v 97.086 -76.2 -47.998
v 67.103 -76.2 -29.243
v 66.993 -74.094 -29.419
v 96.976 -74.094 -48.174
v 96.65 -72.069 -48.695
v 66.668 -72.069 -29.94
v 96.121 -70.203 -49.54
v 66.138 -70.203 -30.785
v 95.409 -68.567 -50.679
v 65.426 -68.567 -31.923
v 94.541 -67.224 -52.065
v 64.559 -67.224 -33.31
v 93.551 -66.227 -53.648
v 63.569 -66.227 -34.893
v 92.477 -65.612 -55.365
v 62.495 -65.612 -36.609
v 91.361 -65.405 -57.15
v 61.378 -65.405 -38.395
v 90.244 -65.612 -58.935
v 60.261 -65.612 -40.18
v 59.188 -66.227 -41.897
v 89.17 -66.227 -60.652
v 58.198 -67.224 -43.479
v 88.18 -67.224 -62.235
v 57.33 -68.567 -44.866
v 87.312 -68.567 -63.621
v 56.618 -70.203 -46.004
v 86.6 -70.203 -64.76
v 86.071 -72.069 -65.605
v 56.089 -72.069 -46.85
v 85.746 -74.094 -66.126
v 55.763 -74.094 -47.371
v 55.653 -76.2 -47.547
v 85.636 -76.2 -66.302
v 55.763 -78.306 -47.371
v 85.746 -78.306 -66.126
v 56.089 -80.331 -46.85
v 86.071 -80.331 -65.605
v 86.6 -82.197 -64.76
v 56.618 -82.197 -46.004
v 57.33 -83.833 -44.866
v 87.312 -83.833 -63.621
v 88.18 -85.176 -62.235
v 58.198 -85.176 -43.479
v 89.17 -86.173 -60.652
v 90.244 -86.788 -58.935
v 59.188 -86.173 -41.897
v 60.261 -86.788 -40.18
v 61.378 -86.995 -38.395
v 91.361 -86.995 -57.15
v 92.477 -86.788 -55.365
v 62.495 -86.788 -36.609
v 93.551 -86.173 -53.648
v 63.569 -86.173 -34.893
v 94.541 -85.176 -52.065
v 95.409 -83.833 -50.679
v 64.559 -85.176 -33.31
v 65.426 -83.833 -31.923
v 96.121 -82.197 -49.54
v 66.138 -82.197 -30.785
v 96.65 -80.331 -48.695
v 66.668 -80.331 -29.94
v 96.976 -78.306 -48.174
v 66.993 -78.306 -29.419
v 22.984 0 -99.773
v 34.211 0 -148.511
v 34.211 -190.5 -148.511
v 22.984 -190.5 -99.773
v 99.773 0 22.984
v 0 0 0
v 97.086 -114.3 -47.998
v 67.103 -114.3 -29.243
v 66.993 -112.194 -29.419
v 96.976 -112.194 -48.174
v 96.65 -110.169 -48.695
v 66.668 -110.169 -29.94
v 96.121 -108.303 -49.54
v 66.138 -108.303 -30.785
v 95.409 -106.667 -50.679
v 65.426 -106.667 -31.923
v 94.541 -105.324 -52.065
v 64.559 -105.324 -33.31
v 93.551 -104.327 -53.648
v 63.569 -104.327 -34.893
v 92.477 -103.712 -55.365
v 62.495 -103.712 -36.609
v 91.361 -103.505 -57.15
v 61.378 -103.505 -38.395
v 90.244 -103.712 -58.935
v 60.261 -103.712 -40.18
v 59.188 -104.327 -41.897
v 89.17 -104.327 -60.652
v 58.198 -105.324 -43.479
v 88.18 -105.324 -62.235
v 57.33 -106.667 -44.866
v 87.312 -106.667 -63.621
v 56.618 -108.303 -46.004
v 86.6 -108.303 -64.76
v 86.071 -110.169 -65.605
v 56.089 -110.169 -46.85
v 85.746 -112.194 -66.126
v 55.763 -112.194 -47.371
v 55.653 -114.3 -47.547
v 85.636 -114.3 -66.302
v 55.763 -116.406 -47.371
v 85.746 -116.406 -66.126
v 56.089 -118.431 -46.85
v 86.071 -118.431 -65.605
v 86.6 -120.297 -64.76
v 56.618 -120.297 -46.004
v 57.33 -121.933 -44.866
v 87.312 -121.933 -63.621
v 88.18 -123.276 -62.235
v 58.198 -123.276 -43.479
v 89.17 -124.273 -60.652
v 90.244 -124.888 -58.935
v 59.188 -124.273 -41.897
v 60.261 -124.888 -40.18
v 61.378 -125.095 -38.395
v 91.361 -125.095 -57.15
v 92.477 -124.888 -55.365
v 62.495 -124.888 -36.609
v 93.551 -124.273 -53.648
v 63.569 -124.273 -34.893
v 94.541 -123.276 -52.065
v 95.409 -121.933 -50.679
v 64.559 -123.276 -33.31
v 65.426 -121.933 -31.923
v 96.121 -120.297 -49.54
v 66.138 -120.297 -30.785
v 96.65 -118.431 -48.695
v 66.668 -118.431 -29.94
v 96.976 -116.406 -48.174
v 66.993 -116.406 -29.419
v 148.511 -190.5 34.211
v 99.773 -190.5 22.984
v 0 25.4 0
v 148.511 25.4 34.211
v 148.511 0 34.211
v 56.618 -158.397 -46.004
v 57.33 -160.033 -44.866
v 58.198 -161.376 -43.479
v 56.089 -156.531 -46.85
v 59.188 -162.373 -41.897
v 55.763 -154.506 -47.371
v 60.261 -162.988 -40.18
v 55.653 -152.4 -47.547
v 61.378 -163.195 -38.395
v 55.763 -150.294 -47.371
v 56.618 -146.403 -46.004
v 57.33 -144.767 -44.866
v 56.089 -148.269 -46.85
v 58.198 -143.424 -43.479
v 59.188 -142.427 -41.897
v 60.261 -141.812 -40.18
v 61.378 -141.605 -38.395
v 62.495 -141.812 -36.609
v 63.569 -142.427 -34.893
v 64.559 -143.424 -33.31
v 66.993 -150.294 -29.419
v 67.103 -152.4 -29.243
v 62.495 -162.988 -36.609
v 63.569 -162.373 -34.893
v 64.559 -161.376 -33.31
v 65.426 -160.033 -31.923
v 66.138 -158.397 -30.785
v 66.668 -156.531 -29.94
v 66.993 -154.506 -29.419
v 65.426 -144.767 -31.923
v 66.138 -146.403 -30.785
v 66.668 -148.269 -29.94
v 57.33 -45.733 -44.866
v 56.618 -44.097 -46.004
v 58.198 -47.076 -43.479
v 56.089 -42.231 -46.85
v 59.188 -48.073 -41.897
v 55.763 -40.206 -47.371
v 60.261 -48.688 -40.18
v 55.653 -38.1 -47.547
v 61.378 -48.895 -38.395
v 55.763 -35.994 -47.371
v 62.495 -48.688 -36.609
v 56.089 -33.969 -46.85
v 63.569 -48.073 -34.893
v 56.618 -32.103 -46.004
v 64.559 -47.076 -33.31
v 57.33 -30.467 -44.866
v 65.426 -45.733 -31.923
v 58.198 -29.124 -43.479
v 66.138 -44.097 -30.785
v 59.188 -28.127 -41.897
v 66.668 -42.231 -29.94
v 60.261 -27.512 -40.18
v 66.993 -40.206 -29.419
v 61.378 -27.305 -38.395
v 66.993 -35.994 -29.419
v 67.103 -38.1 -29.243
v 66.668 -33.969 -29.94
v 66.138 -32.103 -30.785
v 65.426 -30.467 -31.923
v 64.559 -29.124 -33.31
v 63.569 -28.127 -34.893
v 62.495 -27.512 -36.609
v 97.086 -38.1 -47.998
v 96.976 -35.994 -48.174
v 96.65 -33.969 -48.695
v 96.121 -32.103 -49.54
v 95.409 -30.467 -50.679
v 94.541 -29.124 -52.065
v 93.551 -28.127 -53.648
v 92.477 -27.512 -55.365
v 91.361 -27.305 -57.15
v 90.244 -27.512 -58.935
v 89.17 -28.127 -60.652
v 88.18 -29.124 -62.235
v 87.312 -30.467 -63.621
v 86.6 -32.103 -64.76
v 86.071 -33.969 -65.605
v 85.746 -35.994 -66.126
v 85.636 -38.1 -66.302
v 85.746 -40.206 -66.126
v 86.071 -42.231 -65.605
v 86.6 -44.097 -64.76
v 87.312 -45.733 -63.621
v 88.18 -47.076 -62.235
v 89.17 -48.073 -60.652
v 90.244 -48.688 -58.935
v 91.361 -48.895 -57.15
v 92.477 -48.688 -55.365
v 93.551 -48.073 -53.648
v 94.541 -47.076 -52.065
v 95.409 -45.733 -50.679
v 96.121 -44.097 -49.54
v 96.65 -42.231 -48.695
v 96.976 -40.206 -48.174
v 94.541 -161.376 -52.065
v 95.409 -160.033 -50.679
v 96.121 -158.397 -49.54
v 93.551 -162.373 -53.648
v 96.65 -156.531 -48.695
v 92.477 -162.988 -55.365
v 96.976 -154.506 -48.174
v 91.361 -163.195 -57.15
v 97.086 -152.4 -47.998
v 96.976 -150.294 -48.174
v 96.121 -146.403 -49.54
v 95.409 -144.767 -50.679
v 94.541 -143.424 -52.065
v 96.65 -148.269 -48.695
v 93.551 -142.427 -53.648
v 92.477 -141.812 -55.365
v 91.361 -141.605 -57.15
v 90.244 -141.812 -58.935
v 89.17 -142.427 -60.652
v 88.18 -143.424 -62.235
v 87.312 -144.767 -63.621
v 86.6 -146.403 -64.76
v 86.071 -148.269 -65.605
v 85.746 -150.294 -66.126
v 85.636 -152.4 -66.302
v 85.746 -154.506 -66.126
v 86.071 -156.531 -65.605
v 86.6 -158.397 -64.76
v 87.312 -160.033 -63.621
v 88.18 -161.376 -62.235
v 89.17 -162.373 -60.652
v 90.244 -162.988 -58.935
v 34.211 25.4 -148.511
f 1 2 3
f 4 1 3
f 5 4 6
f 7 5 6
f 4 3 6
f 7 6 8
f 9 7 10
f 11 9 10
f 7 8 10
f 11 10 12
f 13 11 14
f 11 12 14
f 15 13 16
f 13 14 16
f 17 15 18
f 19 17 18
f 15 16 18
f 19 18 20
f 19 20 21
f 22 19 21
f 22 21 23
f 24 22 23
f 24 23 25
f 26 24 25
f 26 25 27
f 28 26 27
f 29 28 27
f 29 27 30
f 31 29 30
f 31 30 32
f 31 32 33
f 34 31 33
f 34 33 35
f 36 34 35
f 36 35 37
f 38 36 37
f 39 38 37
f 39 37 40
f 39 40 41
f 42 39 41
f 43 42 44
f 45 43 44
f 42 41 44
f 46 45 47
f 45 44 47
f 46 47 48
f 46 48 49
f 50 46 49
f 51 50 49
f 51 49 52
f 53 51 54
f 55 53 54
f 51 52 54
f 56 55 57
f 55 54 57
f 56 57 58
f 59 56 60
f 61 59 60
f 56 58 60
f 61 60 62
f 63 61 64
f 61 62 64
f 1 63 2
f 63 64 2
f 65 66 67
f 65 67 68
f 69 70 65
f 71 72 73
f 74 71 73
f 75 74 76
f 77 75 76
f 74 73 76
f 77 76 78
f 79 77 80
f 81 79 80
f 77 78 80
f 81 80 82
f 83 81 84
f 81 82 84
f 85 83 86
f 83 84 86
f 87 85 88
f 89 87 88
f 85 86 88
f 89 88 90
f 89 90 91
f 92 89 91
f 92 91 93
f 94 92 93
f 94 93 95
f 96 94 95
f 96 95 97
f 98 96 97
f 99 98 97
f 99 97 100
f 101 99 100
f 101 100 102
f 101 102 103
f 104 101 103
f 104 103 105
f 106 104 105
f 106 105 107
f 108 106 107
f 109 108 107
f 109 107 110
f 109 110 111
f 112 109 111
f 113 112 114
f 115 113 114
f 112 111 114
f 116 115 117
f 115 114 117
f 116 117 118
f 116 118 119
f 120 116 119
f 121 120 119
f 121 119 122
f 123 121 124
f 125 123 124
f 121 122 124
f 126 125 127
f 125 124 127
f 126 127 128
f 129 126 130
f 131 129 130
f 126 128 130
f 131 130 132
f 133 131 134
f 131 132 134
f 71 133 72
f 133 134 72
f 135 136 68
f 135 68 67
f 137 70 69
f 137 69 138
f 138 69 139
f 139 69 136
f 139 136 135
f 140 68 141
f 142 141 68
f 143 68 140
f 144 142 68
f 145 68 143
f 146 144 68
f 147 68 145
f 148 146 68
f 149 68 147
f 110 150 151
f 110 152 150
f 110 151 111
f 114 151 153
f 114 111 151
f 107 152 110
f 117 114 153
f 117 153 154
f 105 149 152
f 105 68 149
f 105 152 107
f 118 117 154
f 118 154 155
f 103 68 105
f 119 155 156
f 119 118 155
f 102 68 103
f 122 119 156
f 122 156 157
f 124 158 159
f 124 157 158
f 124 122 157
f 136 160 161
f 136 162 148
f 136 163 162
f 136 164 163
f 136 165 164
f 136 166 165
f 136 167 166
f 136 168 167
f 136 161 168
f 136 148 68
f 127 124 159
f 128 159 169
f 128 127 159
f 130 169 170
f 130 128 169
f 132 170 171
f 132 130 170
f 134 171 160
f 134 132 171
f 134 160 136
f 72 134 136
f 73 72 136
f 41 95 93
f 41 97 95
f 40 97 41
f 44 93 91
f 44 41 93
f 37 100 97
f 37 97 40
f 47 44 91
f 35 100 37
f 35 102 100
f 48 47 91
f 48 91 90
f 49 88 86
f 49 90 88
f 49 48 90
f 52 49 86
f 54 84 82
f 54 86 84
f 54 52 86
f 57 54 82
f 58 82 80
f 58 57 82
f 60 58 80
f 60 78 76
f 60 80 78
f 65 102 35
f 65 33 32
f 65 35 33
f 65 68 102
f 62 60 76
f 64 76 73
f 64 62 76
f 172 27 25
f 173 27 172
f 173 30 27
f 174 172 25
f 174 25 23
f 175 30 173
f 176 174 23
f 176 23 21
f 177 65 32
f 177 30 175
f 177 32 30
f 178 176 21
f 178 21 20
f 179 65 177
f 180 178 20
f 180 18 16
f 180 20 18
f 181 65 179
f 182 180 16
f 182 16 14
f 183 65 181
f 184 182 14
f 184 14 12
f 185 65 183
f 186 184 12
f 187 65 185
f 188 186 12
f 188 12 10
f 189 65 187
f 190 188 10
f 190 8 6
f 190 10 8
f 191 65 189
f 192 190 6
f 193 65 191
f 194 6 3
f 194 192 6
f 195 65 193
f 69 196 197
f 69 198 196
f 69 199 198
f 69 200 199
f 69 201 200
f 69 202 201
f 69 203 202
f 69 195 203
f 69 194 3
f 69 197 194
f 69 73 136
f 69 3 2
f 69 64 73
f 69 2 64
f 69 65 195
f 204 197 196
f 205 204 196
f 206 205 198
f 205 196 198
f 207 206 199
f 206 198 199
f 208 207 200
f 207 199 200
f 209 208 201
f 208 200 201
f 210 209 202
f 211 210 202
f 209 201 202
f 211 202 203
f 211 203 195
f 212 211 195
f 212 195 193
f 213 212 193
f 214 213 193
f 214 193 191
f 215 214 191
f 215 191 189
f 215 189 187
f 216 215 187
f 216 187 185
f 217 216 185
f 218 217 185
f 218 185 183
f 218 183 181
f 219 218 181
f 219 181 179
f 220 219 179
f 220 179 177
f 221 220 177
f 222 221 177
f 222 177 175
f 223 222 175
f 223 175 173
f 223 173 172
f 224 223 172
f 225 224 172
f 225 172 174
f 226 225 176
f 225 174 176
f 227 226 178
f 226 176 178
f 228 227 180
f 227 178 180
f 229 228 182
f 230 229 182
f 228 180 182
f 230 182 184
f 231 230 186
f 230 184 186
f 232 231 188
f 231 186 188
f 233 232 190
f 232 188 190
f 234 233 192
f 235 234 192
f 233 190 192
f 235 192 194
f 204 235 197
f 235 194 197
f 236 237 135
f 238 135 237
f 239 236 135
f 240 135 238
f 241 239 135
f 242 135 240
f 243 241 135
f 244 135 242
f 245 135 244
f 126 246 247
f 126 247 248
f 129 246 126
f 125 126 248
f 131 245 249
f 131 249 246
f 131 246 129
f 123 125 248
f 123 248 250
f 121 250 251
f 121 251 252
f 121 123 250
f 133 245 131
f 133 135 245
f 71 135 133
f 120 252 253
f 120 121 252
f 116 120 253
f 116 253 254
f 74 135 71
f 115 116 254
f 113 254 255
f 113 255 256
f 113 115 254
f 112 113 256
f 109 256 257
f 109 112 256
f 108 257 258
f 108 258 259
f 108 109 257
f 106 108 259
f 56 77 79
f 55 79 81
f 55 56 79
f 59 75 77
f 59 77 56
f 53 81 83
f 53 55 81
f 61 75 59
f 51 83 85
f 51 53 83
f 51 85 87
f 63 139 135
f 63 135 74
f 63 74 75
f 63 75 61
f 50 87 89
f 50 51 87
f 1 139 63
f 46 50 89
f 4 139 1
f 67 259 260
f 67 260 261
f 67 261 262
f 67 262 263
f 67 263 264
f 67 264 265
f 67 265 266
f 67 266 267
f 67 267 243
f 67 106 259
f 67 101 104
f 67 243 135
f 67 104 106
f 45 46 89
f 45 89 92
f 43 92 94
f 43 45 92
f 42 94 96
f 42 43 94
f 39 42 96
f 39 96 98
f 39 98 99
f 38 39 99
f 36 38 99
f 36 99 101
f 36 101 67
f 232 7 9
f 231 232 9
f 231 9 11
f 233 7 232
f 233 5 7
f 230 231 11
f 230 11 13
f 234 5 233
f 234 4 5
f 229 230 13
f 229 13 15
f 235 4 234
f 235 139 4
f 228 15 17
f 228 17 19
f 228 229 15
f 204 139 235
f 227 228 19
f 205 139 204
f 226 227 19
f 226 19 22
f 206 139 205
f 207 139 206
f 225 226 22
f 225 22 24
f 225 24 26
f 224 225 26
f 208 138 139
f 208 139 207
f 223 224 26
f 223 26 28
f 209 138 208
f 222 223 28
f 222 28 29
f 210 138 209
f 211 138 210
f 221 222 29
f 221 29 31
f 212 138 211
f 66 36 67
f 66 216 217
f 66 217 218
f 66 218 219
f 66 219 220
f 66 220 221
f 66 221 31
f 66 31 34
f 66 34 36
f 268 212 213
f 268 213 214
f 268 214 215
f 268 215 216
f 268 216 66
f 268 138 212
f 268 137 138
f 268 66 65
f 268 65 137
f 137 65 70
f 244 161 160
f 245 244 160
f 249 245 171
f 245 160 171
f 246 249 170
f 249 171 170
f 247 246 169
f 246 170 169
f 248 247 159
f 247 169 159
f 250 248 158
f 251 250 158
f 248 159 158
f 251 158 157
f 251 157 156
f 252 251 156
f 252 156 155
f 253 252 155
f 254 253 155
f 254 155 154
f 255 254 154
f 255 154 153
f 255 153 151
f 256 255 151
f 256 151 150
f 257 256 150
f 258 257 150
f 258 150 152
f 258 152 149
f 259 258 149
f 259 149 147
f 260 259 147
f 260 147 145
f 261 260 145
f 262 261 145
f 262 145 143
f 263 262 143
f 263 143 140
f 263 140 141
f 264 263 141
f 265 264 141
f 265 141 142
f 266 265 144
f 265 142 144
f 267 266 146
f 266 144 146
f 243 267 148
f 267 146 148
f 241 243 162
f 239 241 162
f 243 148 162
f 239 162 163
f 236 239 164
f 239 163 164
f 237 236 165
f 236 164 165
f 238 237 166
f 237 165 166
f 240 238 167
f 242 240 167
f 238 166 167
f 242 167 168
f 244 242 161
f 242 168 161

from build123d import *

# Parameters (mm, degrees)
BOSS_EXTRUDE1_DEPTH = 25.4
BOSS_EXTRUDE2_DEPTH = 215.9
SKETCH3_R           = 10.795
CUT_EXTRUDE1_DEPTH  = 381


with BuildPart() as part:
    # Sketch1 → Boss-Extrude1 (new body)
    with BuildSketch(Plane(origin=(0, 0, 0), x_dir=(1, 0, 0), z_dir=(0, 1, 0))):
        Polygon((0, 0), (148.510590519, -34.210590519), (34.210590519, 148.510590519), align=None)
    extrude(amount=BOSS_EXTRUDE1_DEPTH)

    # Sketch2 → Boss-Extrude2 (add)
    with BuildSketch(Plane(origin=(0, 25.4, 0), x_dir=(1, 0, 0), z_dir=(0, 1, 0))):
        Polygon((34.210590519, 148.510590519), (22.983547144, 99.773202004), (99.773202004, -22.983547144), (148.510590519, -34.210590519), align=None)
    extrude(amount=-BOSS_EXTRUDE2_DEPTH)

    # Sketch3 → Cut-Extrude1 (cut)
    with BuildSketch(Plane(origin=(61.378374574, 0, -38.39482743), x_dir=(0.5303300858898913, 0, 0.8477912478906706), z_dir=(-0.8477912478906706, 0, 0.5303300858898913))):
        with Locations((0, -38.1)):
            Circle(SKETCH3_R)
        with Locations((0, -114.3)):
            Circle(SKETCH3_R)
        with Locations((0, -152.4)):
            Circle(SKETCH3_R)
        with Locations((0, -76.2)):
            Circle(SKETCH3_R)
    extrude(amount=-CUT_EXTRUDE1_DEPTH, mode=Mode.SUBTRACT)


solid = part.part
